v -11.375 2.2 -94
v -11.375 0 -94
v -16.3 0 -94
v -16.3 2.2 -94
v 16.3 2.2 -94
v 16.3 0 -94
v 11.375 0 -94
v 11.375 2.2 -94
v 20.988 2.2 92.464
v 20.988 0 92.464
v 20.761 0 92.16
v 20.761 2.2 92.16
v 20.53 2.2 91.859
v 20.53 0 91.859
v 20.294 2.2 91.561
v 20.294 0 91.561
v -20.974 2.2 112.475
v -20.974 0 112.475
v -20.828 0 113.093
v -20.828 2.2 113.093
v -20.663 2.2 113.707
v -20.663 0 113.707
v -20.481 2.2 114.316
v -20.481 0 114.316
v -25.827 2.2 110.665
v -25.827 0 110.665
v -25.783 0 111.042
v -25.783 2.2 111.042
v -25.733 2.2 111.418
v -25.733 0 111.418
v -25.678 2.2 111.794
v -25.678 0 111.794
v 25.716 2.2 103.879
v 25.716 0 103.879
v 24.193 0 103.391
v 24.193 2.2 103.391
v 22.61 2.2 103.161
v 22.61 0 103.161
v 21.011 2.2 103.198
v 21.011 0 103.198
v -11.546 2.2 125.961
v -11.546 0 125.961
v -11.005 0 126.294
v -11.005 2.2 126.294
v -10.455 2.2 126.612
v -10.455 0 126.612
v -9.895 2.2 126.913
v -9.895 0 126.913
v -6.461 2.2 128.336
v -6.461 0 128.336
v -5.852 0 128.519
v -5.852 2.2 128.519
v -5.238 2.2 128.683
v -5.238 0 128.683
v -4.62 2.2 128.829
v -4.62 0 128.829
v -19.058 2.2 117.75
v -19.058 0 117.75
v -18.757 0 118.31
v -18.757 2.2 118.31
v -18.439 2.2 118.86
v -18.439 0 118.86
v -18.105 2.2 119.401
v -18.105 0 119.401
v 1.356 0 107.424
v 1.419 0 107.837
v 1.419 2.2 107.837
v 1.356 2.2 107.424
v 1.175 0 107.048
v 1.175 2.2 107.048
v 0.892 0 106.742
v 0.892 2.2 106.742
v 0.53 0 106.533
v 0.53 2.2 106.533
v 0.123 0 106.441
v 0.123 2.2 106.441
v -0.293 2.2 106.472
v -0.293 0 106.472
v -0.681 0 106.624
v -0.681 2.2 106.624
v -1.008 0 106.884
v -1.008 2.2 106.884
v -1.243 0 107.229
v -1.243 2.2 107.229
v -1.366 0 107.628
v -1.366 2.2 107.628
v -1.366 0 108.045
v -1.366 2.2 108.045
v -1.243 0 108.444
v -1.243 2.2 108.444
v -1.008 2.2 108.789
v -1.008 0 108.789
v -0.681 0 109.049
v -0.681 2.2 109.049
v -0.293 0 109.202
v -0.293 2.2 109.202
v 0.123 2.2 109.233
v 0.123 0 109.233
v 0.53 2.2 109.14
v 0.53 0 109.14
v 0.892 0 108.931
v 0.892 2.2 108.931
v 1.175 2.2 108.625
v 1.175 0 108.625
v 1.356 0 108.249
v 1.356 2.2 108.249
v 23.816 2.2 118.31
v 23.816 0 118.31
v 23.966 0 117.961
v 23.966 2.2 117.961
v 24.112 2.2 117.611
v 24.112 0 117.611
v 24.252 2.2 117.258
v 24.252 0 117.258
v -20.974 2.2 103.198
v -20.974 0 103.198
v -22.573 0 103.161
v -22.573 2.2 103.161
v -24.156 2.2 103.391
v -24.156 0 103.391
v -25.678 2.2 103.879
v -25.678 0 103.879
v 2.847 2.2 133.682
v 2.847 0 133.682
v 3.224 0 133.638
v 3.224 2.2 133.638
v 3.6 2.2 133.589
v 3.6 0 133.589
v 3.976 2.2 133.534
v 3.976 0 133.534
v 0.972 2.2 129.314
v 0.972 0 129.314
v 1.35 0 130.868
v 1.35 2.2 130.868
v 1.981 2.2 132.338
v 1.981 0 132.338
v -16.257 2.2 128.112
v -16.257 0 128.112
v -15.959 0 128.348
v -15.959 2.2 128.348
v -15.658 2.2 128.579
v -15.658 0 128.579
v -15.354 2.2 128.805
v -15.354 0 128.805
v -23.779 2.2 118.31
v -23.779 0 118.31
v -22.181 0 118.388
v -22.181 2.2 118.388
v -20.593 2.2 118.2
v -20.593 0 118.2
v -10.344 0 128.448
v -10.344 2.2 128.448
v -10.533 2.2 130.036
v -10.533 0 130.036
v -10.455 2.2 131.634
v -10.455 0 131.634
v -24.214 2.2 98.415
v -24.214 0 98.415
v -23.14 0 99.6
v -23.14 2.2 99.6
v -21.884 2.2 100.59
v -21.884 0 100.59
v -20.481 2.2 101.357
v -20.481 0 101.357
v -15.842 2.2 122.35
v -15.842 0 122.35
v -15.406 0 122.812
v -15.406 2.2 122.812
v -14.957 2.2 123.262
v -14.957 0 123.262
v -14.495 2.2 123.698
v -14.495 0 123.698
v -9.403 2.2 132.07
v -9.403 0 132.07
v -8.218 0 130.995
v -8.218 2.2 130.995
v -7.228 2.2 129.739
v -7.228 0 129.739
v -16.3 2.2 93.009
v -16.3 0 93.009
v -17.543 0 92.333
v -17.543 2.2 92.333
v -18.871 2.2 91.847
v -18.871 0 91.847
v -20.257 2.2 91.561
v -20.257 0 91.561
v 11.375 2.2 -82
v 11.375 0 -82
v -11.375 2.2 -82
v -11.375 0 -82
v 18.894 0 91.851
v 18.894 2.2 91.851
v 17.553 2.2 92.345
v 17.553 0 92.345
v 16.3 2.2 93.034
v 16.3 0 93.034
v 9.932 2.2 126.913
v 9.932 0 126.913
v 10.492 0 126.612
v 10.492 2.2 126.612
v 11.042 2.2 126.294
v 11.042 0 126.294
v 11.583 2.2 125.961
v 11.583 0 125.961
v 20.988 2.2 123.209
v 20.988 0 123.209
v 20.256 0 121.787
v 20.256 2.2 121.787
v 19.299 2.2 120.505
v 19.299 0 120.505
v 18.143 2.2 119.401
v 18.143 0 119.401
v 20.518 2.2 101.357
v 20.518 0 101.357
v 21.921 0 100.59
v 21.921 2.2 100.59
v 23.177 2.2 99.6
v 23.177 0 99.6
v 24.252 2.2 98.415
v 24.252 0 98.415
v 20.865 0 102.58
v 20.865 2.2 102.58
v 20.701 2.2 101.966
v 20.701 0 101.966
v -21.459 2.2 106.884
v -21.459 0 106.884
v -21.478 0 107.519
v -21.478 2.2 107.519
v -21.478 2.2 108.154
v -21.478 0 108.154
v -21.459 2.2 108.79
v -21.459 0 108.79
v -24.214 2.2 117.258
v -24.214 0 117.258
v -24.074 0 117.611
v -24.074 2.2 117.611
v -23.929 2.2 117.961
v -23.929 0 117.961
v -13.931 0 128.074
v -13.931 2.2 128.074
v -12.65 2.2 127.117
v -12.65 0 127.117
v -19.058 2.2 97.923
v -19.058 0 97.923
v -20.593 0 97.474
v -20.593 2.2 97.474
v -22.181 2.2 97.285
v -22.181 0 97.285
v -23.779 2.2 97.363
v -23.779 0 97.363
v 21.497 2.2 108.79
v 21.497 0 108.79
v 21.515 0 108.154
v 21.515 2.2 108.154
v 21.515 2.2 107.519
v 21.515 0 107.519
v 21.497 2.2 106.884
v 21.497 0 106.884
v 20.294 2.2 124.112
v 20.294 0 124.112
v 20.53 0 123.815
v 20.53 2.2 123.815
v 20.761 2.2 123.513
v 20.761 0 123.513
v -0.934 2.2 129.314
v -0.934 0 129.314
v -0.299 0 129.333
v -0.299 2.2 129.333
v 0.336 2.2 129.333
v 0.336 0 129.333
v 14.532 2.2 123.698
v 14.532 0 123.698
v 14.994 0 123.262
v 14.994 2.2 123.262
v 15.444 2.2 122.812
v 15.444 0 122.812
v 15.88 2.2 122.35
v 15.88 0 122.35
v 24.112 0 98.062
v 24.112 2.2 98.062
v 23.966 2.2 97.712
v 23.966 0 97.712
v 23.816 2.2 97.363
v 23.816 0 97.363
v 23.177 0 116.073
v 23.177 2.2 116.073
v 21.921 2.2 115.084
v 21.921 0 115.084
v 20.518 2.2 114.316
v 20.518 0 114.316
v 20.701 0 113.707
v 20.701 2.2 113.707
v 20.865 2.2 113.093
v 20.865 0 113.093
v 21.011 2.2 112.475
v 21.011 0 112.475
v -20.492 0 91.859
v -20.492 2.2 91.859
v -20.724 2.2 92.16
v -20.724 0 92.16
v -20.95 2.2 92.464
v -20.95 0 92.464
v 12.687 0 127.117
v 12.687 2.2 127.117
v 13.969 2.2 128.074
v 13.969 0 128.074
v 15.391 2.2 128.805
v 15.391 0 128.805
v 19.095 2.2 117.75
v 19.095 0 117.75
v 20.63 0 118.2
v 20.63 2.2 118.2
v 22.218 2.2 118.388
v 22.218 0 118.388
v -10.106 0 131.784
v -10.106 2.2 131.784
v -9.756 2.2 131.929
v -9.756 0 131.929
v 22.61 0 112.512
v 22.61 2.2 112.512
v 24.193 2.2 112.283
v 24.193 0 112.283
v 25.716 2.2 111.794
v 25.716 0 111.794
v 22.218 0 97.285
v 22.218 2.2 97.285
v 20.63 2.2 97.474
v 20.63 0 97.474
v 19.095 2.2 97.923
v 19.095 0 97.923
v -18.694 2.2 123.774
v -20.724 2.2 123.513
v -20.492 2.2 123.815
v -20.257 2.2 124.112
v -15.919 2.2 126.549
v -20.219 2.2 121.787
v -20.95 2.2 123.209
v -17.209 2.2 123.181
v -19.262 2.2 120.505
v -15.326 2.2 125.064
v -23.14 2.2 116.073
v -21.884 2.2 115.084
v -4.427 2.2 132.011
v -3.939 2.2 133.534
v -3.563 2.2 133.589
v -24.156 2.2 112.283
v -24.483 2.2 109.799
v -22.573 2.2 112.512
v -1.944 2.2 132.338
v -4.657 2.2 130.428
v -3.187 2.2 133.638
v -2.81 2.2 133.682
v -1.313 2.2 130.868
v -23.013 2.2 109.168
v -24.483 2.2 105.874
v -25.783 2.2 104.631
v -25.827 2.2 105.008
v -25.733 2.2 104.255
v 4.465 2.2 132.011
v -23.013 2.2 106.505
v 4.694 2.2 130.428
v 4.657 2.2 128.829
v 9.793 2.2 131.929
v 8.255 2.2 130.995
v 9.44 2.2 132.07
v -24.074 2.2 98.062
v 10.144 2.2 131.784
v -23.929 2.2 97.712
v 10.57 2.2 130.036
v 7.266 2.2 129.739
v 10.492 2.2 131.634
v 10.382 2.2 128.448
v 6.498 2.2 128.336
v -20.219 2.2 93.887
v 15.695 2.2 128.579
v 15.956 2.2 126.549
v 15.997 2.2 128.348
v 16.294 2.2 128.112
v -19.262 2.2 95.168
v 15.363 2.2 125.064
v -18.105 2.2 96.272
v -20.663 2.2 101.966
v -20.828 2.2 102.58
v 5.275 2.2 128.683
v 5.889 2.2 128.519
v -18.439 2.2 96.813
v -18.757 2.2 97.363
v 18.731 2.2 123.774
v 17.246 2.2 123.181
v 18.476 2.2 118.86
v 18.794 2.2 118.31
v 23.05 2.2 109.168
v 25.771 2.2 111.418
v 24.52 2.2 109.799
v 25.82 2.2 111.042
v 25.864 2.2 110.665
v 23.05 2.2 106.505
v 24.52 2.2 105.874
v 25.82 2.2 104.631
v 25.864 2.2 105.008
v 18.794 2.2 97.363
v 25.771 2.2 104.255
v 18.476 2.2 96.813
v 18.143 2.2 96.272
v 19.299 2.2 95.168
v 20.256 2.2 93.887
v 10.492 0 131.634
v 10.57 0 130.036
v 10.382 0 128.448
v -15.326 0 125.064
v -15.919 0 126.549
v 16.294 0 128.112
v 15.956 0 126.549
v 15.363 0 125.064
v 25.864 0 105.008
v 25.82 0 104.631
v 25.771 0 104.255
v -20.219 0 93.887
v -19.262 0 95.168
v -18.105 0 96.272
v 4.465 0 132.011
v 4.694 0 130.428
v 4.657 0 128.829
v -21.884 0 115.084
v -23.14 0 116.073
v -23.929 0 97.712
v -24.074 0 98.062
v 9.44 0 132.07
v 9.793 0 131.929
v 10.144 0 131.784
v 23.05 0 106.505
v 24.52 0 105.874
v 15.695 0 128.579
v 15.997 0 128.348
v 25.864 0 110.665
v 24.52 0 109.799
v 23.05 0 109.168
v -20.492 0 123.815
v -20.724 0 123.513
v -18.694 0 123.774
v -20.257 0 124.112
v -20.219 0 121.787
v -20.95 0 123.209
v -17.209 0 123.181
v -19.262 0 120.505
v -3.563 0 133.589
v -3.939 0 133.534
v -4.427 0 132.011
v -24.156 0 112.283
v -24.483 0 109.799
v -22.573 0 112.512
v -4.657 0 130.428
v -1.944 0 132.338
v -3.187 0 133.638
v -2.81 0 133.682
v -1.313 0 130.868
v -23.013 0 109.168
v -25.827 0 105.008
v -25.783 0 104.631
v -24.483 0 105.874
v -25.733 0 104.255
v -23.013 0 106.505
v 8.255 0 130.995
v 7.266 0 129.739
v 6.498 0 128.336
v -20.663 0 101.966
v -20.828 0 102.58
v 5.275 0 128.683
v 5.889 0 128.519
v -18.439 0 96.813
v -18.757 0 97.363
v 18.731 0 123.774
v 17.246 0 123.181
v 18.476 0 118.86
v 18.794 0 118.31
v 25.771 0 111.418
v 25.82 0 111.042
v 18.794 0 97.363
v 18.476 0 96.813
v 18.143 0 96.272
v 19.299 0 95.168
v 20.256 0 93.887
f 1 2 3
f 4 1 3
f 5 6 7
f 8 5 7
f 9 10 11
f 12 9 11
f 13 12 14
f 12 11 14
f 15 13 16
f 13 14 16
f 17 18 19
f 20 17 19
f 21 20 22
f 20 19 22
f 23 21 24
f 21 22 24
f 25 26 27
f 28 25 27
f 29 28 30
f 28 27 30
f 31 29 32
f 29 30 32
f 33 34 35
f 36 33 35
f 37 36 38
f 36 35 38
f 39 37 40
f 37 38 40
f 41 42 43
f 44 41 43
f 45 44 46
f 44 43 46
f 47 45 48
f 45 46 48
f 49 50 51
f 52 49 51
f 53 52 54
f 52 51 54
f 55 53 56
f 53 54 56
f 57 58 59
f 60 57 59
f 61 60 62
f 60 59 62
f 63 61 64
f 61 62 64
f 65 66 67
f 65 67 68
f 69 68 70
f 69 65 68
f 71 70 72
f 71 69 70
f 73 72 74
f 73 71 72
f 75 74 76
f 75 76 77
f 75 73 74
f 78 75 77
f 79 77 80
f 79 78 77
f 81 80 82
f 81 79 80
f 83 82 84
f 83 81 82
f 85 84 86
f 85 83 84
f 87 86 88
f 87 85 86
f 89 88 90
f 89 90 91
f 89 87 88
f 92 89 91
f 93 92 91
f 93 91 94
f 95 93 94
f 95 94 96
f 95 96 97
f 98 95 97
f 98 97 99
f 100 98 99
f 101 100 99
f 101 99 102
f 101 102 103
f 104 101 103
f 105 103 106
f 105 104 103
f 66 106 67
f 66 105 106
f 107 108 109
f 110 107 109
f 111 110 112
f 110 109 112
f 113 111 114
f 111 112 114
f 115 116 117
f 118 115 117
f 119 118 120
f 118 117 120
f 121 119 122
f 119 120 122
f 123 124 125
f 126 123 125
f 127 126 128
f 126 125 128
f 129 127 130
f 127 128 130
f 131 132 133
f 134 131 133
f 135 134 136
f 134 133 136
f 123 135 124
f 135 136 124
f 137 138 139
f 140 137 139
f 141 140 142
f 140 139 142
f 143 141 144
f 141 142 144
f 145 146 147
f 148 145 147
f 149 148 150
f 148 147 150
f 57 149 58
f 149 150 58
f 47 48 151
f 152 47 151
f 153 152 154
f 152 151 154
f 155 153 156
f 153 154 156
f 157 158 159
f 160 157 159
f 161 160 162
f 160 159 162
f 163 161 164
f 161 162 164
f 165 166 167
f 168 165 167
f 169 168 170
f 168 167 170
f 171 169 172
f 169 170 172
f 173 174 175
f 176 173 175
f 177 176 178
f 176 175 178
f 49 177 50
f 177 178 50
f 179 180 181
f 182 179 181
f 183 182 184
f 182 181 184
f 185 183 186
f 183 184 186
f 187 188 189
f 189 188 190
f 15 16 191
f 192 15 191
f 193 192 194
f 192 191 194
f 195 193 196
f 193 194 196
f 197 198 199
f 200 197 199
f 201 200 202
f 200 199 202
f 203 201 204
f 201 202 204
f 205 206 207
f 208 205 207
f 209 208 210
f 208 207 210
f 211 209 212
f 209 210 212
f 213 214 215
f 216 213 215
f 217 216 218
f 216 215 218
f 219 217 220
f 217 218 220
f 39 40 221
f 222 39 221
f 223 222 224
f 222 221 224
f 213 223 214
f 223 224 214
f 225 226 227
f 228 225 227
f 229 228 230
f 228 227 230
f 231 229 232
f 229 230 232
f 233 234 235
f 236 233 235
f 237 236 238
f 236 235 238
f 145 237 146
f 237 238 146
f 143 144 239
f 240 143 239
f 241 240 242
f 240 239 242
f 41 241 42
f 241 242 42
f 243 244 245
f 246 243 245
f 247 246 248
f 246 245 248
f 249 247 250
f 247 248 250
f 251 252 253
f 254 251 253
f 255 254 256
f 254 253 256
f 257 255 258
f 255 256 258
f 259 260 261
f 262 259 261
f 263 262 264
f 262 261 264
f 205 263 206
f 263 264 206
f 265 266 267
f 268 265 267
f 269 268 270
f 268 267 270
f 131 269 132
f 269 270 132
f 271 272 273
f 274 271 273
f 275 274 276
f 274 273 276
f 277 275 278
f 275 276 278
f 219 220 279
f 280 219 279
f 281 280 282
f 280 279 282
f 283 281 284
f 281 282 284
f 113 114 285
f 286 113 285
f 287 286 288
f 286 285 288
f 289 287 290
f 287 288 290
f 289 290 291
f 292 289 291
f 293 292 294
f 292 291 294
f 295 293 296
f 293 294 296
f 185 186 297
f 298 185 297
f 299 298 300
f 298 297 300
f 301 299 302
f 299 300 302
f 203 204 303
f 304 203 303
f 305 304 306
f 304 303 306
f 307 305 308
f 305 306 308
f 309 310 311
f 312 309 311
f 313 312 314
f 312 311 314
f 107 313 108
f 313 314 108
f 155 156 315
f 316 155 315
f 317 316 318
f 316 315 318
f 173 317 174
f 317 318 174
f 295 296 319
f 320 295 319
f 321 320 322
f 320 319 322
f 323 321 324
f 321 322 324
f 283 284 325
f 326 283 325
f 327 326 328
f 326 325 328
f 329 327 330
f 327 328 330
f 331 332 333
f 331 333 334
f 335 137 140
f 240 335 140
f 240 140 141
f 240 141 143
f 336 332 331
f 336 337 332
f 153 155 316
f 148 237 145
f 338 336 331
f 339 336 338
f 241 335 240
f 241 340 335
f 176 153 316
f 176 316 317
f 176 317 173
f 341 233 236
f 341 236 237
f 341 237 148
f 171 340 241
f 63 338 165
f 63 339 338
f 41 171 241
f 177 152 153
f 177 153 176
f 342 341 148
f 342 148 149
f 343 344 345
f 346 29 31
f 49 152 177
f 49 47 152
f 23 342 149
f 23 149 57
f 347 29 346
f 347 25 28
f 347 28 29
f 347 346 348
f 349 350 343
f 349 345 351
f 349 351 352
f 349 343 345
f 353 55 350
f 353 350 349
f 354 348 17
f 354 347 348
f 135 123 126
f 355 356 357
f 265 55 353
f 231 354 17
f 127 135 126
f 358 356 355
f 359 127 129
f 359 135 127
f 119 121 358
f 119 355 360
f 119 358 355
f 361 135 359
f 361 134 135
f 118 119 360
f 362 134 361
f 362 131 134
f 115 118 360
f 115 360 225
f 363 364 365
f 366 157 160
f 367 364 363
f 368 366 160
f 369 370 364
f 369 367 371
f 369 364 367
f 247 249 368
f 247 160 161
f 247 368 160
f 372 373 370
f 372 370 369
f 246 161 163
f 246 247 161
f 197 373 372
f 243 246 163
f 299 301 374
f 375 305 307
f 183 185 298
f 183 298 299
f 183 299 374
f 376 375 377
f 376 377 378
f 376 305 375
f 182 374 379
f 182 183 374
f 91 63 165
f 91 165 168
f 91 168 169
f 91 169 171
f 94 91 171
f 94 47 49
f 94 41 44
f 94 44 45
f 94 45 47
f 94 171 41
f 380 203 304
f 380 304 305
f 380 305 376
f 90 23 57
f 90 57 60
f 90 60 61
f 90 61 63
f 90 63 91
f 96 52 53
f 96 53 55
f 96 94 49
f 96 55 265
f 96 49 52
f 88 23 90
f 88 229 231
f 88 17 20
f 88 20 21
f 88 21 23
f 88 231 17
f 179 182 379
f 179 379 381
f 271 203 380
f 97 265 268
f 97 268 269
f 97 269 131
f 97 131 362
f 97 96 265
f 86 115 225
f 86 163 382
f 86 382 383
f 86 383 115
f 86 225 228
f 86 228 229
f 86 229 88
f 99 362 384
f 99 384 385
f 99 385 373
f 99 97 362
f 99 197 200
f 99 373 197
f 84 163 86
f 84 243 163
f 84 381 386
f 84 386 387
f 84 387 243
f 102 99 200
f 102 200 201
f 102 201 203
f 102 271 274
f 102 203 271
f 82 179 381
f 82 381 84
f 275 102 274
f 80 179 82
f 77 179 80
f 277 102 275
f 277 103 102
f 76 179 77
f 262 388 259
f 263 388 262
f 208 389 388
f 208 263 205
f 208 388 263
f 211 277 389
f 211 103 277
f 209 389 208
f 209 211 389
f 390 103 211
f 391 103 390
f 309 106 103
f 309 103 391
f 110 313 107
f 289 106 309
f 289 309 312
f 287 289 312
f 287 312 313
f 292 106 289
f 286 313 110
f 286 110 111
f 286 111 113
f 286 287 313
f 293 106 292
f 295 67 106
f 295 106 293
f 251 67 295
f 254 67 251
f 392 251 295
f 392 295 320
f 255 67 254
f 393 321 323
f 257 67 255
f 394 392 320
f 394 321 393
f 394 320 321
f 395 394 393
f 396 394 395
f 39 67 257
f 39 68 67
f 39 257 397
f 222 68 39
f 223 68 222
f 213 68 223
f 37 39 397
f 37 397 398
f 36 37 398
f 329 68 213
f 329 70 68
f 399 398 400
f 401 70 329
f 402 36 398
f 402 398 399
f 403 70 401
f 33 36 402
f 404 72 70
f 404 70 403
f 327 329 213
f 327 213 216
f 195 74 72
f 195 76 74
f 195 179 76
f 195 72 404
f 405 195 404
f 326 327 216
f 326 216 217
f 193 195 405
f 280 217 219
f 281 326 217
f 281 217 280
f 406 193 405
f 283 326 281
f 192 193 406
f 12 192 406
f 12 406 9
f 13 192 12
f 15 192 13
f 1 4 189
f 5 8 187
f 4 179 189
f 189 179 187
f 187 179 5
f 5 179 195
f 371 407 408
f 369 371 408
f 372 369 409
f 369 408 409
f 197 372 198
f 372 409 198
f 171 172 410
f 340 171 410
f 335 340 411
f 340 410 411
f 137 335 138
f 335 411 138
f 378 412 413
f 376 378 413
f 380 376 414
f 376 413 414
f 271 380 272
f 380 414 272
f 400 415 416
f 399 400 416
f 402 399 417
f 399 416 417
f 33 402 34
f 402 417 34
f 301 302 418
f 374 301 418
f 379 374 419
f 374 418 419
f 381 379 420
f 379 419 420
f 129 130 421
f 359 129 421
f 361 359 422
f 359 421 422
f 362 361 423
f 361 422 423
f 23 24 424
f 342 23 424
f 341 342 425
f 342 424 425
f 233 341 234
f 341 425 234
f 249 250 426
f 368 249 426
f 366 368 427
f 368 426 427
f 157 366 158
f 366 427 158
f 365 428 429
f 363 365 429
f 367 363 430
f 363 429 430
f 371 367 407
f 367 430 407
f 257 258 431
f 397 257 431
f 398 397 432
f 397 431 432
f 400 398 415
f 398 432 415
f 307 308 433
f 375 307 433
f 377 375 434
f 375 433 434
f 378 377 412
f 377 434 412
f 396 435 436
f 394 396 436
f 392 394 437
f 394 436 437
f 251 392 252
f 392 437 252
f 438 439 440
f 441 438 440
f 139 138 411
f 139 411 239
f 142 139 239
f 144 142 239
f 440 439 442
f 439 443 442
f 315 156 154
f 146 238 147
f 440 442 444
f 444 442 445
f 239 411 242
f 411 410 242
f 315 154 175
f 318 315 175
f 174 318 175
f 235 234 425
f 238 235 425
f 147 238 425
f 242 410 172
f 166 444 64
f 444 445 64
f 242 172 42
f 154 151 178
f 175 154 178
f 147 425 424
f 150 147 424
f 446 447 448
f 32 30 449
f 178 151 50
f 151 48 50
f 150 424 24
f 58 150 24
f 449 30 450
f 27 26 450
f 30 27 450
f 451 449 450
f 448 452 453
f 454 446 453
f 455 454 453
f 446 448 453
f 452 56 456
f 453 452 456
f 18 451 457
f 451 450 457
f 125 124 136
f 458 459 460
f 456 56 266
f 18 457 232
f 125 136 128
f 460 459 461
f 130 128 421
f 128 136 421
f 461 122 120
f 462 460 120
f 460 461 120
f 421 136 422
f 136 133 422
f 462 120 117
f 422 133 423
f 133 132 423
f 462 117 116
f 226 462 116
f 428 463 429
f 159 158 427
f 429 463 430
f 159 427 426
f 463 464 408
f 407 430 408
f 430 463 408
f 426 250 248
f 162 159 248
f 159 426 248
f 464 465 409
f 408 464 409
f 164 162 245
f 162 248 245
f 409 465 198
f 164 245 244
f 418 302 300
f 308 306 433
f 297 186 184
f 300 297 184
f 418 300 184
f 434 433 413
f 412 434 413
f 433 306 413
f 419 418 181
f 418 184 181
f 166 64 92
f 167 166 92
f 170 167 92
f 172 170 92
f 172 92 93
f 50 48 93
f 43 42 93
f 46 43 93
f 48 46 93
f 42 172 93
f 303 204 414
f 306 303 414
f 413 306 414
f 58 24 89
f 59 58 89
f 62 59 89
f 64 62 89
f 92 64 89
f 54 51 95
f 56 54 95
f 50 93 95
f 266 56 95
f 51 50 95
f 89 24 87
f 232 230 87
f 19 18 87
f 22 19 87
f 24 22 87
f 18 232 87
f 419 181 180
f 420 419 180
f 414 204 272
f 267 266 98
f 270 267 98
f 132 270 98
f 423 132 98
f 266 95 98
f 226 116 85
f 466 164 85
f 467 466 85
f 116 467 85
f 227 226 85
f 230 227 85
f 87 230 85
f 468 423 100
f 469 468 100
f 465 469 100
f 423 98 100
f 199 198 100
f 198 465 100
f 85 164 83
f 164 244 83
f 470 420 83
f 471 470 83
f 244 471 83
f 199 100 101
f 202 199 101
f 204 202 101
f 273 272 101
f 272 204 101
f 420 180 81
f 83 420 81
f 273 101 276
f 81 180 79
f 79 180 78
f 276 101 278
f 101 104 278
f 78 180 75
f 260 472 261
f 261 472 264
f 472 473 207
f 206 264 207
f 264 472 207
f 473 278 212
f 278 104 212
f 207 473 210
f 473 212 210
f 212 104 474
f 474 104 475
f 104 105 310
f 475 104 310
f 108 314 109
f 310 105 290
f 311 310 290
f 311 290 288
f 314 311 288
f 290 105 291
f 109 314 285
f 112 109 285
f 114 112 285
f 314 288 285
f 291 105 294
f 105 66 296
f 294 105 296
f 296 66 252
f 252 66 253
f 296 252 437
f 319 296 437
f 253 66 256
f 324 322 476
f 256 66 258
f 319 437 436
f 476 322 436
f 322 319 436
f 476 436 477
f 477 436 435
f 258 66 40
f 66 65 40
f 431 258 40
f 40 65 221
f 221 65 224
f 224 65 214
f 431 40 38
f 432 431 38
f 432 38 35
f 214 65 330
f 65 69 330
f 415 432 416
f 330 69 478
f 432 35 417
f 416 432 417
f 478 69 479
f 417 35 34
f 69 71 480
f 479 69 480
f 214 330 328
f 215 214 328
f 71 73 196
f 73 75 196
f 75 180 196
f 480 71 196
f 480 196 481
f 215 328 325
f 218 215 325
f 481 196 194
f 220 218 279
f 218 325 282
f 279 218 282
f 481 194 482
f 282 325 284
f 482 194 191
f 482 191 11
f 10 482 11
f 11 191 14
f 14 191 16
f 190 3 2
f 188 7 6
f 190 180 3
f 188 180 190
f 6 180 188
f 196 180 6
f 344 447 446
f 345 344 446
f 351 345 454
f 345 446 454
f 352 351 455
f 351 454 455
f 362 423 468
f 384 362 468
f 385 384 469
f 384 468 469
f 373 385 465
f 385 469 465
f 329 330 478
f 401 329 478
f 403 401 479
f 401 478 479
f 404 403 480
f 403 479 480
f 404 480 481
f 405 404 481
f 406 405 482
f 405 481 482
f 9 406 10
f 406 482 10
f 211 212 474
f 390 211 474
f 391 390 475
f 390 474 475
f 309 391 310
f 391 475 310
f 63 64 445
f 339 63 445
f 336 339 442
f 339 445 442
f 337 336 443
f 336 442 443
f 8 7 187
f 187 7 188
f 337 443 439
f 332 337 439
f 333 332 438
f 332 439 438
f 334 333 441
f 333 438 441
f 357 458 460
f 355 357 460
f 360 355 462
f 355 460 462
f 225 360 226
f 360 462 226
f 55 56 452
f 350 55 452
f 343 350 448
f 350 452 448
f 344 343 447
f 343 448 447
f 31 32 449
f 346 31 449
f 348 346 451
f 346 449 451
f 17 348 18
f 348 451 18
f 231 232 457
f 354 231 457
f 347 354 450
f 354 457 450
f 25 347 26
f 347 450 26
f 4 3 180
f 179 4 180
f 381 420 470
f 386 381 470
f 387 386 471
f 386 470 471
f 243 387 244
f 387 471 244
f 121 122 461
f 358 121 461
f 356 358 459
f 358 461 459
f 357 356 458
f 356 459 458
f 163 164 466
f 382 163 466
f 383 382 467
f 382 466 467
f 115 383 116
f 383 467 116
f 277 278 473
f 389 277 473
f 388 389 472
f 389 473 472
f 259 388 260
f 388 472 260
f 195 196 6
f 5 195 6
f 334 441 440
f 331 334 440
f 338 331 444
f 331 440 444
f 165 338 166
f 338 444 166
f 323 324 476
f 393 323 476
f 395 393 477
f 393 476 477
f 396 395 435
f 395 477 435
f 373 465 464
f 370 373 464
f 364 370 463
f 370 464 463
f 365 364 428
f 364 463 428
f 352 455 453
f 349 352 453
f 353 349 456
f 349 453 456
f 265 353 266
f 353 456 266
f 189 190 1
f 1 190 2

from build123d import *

# Parameters (mm, degrees)
SKETCH1_R           = 1.4
BOSS_EXTRUDE2_DEPTH = 2.2


with BuildPart() as part:
    # Sketch1 → Boss-Extrude2 (new body)
    with BuildSketch(Plane(origin=(0, 0, 0), x_dir=(1, 0, 0), z_dir=(0, 1, 0))):
        with BuildLine():
            Line((16.3, 94), (11.375, 94))
            Line((11.375, 94), (11.375, 82))
            Line((11.375, 82), (-11.375, 82))
            Line((-11.375, 82), (-11.375, 94))
            Line((-11.375, 94), (-16.3, 94))
            Line((-16.3, 94), (-16.3, -93.009457189))
            ThreePointArc((-16.3, -93.009457189), (-18.198030993, -92.065396391), (-20.256978495, -91.560908909))
            ThreePointArc((-20.256978495, -91.560908909), (-20.608541379, -92.008832104), (-20.950210791, -92.464346827))
            ThreePointArc((-20.950210791, -92.464346827), (-19.767163473, -94.547256661), (-18.105269554, -96.272429968))
            ThreePointArc((-18.105269554, -96.272429968), (-18.600034687, -97.087129259), (-19.058202403, -97.922958078))
            ThreePointArc((-19.058202403, -97.922958078), (-21.383193272, -97.34630238), (-23.778569761, -97.363208265))
            ThreePointArc((-23.778569761, -97.363208265), (-24.002222377, -97.886860017), (-24.214353801, -98.415284003))
            ThreePointArc((-24.214353801, -98.415284003), (-22.532521108, -100.121025228), (-20.480747143, -101.357284883))
            ThreePointArc((-20.480747143, -101.357284883), (-20.747793871, -102.272278608), (-20.974021483, -103.198209782))
            ThreePointArc((-20.974021483, -103.198209782), (-23.369039687, -103.242955066), (-25.678420136, -103.879253953))
            ThreePointArc((-25.678420136, -103.879253953), (-25.758920927, -104.442948261), (-25.827057957, -105.008270289))
            ThreePointArc((-25.827057957, -105.008270289), (-23.761054008, -106.220599459), (-21.459225003, -106.88369641))
            ThreePointArc((-21.459225003, -106.88369641), (-21.480354532, -107.836629259), (-21.459225003, -108.789562107))
            ThreePointArc((-21.459225003, -108.789562107), (-23.761054008, -109.452659058), (-25.827057957, -110.664988228))
            ThreePointArc((-25.827057957, -110.664988228), (-25.758920927, -111.230310256), (-25.678420136, -111.794004564))
            ThreePointArc((-25.678420136, -111.794004564), (-23.369039687, -112.430303451), (-20.974021484, -112.475048735))
            ThreePointArc((-20.974021484, -112.475048735), (-20.747793871, -113.400979909), (-20.480747144, -114.315973634))
            ThreePointArc((-20.480747144, -114.315973634), (-22.532521108, -115.552233289), (-24.214353801, -117.257974514))
            ThreePointArc((-24.214353801, -117.257974514), (-24.002222377, -117.7863985), (-23.778569761, -118.310050252))
            ThreePointArc((-23.778569761, -118.310050252), (-21.383193272, -118.326956137), (-19.058202403, -117.750300439))
            ThreePointArc((-19.058202403, -117.750300439), (-18.600034687, -118.586129259), (-18.105269555, -119.40082855))
            ThreePointArc((-18.105269555, -119.40082855), (-19.767163473, -121.126001856), (-20.950210791, -123.20891169))
            ThreePointArc((-20.950210791, -123.20891169), (-20.608541379, -123.664426413), (-20.256978495, -124.112349608))
            ThreePointArc((-20.256978495, -124.112349608), (-17.938846915, -123.508710383), (-15.842327667, -122.349951835))
            ThreePointArc((-15.842327667, -122.349951835), (-15.18344322, -123.038717947), (-14.494677108, -123.697602394))
            ThreePointArc((-14.494677108, -123.697602394), (-15.653435656, -125.794121643), (-16.257074881, -128.112253222))
            ThreePointArc((-16.257074881, -128.112253222), (-15.809151686, -128.463816106), (-15.353636963, -128.805485519))
            ThreePointArc((-15.353636963, -128.805485519), (-13.270727129, -127.6224382), (-11.545553822, -125.960544282))
            ThreePointArc((-11.545553822, -125.960544282), (-10.730854531, -126.455309415), (-9.895025712, -126.91347713))
            ThreePointArc((-9.895025712, -126.91347713), (-10.47168141, -129.238467999), (-10.454775525, -131.633844488))
            ThreePointArc((-10.454775525, -131.633844488), (-9.931123773, -131.857497104), (-9.402699787, -132.069628528))
            ThreePointArc((-9.402699787, -132.069628528), (-7.696958562, -130.387795835), (-6.460698907, -128.336021871))
            ThreePointArc((-6.460698907, -128.336021871), (-5.545705182, -128.603068598), (-4.619774008, -128.829296211))
            ThreePointArc((-4.619774008, -128.829296211), (-4.575028724, -131.224314414), (-3.938729837, -133.533694863))
            ThreePointArc((-3.938729837, -133.533694863), (-3.375035529, -133.614195654), (-2.809713501, -133.682332684))
            ThreePointArc((-2.809713501, -133.682332684), (-1.597384331, -131.616328735), (-0.93428738, -129.31449973))
            ThreePointArc((-0.93428738, -129.31449973), (0.018645469, -129.335629259), (0.971578317, -129.31449973))
            ThreePointArc((0.971578317, -129.31449973), (1.634675268, -131.616328735), (2.847004438, -133.682332684))
            ThreePointArc((2.847004438, -133.682332684), (3.412326466, -133.614195654), (3.976020774, -133.533694863))
            ThreePointArc((3.976020774, -133.533694863), (4.612319661, -131.224314414), (4.657064945, -128.829296211))
            ThreePointArc((4.657064945, -128.829296211), (5.582996119, -128.603068598), (6.497989844, -128.336021871))
            ThreePointArc((6.497989844, -128.336021871), (7.734249499, -130.387795835), (9.439990724, -132.069628528))
            ThreePointArc((9.439990724, -132.069628528), (9.96841471, -131.857497104), (10.492066462, -131.633844488))
            ThreePointArc((10.492066462, -131.633844488), (10.508972347, -129.238467999), (9.932316649, -126.91347713))
            ThreePointArc((9.932316649, -126.91347713), (10.768145469, -126.455309415), (11.582844759, -125.960544282))
            ThreePointArc((11.582844759, -125.960544282), (13.308018066, -127.6224382), (15.3909279, -128.805485518))
            ThreePointArc((15.3909279, -128.805485518), (15.846442623, -128.463816106), (16.294365818, -128.112253222))
            ThreePointArc((16.294365818, -128.112253222), (15.690726593, -125.794121643), (14.531968045, -123.697602394))
            ThreePointArc((14.531968045, -123.697602394), (15.220734157, -123.038717947), (15.879618604, -122.349951835))
            ThreePointArc((15.879618604, -122.349951835), (17.976137853, -123.508710383), (20.294269432, -124.112349608))
            ThreePointArc((20.294269432, -124.112349608), (20.645832316, -123.664426413), (20.987501728, -123.20891169))
            ThreePointArc((20.987501728, -123.20891169), (19.80445441, -121.126001856), (18.142560492, -119.400828549))
            ThreePointArc((18.142560492, -119.400828549), (18.637325625, -118.586129259), (19.09549334, -117.750300439))
            ThreePointArc((19.09549334, -117.750300439), (21.420484209, -118.326956137), (23.815860698, -118.310050252))
            ThreePointArc((23.815860698, -118.310050252), (24.039513314, -117.7863985), (24.251644738, -117.257974514))
            ThreePointArc((24.251644738, -117.257974514), (22.569812045, -115.552233289), (20.518038081, -114.315973634))
            ThreePointArc((20.518038081, -114.315973634), (20.785084808, -113.400979909), (21.011312421, -112.475048735))
            ThreePointArc((21.011312421, -112.475048735), (23.406330624, -112.430303451), (25.715711073, -111.794004564))
            ThreePointArc((25.715711073, -111.794004564), (25.796211864, -111.230310256), (25.864348894, -110.664988228))
            ThreePointArc((25.864348894, -110.664988228), (23.798344945, -109.452659058), (21.49651594, -108.789562107))
            ThreePointArc((21.49651594, -108.789562107), (21.517645469, -107.836629259), (21.49651594, -106.88369641))
            ThreePointArc((21.49651594, -106.88369641), (23.798344945, -106.220599459), (25.864348894, -105.008270289))
            ThreePointArc((25.864348894, -105.008270289), (25.796211864, -104.442948261), (25.715711073, -103.879253953))
            ThreePointArc((25.715711073, -103.879253953), (23.406330624, -103.242955066), (21.011312421, -103.198209782))
            ThreePointArc((21.011312421, -103.198209782), (20.785084808, -102.272278608), (20.518038081, -101.357284883))
            ThreePointArc((20.518038081, -101.357284883), (22.569812045, -100.121025228), (24.251644738, -98.415284003))
            ThreePointArc((24.251644738, -98.415284003), (24.039513314, -97.886860017), (23.815860698, -97.363208265))
            ThreePointArc((23.815860698, -97.363208265), (21.420484209, -97.34630238), (19.09549334, -97.922958078))
            ThreePointArc((19.09549334, -97.922958078), (18.637325625, -97.087129259), (18.142560492, -96.272429968))
            ThreePointArc((18.142560492, -96.272429968), (19.80445441, -94.547256661), (20.987501728, -92.464346827))
            ThreePointArc((20.987501728, -92.464346827), (20.645832316, -92.008832104), (20.294269432, -91.560908909))
            ThreePointArc((20.294269432, -91.560908909), (18.214473173, -92.073055949), (16.3, -93.033597224))
            Line((16.3, -93.033597224), (16.3, 94))
        make_face()
        with Locations((0.018645469, -107.836629259)):
            Circle(SKETCH1_R, mode=Mode.SUBTRACT)
    extrude(amount=BOSS_EXTRUDE2_DEPTH)


solid = part.part
